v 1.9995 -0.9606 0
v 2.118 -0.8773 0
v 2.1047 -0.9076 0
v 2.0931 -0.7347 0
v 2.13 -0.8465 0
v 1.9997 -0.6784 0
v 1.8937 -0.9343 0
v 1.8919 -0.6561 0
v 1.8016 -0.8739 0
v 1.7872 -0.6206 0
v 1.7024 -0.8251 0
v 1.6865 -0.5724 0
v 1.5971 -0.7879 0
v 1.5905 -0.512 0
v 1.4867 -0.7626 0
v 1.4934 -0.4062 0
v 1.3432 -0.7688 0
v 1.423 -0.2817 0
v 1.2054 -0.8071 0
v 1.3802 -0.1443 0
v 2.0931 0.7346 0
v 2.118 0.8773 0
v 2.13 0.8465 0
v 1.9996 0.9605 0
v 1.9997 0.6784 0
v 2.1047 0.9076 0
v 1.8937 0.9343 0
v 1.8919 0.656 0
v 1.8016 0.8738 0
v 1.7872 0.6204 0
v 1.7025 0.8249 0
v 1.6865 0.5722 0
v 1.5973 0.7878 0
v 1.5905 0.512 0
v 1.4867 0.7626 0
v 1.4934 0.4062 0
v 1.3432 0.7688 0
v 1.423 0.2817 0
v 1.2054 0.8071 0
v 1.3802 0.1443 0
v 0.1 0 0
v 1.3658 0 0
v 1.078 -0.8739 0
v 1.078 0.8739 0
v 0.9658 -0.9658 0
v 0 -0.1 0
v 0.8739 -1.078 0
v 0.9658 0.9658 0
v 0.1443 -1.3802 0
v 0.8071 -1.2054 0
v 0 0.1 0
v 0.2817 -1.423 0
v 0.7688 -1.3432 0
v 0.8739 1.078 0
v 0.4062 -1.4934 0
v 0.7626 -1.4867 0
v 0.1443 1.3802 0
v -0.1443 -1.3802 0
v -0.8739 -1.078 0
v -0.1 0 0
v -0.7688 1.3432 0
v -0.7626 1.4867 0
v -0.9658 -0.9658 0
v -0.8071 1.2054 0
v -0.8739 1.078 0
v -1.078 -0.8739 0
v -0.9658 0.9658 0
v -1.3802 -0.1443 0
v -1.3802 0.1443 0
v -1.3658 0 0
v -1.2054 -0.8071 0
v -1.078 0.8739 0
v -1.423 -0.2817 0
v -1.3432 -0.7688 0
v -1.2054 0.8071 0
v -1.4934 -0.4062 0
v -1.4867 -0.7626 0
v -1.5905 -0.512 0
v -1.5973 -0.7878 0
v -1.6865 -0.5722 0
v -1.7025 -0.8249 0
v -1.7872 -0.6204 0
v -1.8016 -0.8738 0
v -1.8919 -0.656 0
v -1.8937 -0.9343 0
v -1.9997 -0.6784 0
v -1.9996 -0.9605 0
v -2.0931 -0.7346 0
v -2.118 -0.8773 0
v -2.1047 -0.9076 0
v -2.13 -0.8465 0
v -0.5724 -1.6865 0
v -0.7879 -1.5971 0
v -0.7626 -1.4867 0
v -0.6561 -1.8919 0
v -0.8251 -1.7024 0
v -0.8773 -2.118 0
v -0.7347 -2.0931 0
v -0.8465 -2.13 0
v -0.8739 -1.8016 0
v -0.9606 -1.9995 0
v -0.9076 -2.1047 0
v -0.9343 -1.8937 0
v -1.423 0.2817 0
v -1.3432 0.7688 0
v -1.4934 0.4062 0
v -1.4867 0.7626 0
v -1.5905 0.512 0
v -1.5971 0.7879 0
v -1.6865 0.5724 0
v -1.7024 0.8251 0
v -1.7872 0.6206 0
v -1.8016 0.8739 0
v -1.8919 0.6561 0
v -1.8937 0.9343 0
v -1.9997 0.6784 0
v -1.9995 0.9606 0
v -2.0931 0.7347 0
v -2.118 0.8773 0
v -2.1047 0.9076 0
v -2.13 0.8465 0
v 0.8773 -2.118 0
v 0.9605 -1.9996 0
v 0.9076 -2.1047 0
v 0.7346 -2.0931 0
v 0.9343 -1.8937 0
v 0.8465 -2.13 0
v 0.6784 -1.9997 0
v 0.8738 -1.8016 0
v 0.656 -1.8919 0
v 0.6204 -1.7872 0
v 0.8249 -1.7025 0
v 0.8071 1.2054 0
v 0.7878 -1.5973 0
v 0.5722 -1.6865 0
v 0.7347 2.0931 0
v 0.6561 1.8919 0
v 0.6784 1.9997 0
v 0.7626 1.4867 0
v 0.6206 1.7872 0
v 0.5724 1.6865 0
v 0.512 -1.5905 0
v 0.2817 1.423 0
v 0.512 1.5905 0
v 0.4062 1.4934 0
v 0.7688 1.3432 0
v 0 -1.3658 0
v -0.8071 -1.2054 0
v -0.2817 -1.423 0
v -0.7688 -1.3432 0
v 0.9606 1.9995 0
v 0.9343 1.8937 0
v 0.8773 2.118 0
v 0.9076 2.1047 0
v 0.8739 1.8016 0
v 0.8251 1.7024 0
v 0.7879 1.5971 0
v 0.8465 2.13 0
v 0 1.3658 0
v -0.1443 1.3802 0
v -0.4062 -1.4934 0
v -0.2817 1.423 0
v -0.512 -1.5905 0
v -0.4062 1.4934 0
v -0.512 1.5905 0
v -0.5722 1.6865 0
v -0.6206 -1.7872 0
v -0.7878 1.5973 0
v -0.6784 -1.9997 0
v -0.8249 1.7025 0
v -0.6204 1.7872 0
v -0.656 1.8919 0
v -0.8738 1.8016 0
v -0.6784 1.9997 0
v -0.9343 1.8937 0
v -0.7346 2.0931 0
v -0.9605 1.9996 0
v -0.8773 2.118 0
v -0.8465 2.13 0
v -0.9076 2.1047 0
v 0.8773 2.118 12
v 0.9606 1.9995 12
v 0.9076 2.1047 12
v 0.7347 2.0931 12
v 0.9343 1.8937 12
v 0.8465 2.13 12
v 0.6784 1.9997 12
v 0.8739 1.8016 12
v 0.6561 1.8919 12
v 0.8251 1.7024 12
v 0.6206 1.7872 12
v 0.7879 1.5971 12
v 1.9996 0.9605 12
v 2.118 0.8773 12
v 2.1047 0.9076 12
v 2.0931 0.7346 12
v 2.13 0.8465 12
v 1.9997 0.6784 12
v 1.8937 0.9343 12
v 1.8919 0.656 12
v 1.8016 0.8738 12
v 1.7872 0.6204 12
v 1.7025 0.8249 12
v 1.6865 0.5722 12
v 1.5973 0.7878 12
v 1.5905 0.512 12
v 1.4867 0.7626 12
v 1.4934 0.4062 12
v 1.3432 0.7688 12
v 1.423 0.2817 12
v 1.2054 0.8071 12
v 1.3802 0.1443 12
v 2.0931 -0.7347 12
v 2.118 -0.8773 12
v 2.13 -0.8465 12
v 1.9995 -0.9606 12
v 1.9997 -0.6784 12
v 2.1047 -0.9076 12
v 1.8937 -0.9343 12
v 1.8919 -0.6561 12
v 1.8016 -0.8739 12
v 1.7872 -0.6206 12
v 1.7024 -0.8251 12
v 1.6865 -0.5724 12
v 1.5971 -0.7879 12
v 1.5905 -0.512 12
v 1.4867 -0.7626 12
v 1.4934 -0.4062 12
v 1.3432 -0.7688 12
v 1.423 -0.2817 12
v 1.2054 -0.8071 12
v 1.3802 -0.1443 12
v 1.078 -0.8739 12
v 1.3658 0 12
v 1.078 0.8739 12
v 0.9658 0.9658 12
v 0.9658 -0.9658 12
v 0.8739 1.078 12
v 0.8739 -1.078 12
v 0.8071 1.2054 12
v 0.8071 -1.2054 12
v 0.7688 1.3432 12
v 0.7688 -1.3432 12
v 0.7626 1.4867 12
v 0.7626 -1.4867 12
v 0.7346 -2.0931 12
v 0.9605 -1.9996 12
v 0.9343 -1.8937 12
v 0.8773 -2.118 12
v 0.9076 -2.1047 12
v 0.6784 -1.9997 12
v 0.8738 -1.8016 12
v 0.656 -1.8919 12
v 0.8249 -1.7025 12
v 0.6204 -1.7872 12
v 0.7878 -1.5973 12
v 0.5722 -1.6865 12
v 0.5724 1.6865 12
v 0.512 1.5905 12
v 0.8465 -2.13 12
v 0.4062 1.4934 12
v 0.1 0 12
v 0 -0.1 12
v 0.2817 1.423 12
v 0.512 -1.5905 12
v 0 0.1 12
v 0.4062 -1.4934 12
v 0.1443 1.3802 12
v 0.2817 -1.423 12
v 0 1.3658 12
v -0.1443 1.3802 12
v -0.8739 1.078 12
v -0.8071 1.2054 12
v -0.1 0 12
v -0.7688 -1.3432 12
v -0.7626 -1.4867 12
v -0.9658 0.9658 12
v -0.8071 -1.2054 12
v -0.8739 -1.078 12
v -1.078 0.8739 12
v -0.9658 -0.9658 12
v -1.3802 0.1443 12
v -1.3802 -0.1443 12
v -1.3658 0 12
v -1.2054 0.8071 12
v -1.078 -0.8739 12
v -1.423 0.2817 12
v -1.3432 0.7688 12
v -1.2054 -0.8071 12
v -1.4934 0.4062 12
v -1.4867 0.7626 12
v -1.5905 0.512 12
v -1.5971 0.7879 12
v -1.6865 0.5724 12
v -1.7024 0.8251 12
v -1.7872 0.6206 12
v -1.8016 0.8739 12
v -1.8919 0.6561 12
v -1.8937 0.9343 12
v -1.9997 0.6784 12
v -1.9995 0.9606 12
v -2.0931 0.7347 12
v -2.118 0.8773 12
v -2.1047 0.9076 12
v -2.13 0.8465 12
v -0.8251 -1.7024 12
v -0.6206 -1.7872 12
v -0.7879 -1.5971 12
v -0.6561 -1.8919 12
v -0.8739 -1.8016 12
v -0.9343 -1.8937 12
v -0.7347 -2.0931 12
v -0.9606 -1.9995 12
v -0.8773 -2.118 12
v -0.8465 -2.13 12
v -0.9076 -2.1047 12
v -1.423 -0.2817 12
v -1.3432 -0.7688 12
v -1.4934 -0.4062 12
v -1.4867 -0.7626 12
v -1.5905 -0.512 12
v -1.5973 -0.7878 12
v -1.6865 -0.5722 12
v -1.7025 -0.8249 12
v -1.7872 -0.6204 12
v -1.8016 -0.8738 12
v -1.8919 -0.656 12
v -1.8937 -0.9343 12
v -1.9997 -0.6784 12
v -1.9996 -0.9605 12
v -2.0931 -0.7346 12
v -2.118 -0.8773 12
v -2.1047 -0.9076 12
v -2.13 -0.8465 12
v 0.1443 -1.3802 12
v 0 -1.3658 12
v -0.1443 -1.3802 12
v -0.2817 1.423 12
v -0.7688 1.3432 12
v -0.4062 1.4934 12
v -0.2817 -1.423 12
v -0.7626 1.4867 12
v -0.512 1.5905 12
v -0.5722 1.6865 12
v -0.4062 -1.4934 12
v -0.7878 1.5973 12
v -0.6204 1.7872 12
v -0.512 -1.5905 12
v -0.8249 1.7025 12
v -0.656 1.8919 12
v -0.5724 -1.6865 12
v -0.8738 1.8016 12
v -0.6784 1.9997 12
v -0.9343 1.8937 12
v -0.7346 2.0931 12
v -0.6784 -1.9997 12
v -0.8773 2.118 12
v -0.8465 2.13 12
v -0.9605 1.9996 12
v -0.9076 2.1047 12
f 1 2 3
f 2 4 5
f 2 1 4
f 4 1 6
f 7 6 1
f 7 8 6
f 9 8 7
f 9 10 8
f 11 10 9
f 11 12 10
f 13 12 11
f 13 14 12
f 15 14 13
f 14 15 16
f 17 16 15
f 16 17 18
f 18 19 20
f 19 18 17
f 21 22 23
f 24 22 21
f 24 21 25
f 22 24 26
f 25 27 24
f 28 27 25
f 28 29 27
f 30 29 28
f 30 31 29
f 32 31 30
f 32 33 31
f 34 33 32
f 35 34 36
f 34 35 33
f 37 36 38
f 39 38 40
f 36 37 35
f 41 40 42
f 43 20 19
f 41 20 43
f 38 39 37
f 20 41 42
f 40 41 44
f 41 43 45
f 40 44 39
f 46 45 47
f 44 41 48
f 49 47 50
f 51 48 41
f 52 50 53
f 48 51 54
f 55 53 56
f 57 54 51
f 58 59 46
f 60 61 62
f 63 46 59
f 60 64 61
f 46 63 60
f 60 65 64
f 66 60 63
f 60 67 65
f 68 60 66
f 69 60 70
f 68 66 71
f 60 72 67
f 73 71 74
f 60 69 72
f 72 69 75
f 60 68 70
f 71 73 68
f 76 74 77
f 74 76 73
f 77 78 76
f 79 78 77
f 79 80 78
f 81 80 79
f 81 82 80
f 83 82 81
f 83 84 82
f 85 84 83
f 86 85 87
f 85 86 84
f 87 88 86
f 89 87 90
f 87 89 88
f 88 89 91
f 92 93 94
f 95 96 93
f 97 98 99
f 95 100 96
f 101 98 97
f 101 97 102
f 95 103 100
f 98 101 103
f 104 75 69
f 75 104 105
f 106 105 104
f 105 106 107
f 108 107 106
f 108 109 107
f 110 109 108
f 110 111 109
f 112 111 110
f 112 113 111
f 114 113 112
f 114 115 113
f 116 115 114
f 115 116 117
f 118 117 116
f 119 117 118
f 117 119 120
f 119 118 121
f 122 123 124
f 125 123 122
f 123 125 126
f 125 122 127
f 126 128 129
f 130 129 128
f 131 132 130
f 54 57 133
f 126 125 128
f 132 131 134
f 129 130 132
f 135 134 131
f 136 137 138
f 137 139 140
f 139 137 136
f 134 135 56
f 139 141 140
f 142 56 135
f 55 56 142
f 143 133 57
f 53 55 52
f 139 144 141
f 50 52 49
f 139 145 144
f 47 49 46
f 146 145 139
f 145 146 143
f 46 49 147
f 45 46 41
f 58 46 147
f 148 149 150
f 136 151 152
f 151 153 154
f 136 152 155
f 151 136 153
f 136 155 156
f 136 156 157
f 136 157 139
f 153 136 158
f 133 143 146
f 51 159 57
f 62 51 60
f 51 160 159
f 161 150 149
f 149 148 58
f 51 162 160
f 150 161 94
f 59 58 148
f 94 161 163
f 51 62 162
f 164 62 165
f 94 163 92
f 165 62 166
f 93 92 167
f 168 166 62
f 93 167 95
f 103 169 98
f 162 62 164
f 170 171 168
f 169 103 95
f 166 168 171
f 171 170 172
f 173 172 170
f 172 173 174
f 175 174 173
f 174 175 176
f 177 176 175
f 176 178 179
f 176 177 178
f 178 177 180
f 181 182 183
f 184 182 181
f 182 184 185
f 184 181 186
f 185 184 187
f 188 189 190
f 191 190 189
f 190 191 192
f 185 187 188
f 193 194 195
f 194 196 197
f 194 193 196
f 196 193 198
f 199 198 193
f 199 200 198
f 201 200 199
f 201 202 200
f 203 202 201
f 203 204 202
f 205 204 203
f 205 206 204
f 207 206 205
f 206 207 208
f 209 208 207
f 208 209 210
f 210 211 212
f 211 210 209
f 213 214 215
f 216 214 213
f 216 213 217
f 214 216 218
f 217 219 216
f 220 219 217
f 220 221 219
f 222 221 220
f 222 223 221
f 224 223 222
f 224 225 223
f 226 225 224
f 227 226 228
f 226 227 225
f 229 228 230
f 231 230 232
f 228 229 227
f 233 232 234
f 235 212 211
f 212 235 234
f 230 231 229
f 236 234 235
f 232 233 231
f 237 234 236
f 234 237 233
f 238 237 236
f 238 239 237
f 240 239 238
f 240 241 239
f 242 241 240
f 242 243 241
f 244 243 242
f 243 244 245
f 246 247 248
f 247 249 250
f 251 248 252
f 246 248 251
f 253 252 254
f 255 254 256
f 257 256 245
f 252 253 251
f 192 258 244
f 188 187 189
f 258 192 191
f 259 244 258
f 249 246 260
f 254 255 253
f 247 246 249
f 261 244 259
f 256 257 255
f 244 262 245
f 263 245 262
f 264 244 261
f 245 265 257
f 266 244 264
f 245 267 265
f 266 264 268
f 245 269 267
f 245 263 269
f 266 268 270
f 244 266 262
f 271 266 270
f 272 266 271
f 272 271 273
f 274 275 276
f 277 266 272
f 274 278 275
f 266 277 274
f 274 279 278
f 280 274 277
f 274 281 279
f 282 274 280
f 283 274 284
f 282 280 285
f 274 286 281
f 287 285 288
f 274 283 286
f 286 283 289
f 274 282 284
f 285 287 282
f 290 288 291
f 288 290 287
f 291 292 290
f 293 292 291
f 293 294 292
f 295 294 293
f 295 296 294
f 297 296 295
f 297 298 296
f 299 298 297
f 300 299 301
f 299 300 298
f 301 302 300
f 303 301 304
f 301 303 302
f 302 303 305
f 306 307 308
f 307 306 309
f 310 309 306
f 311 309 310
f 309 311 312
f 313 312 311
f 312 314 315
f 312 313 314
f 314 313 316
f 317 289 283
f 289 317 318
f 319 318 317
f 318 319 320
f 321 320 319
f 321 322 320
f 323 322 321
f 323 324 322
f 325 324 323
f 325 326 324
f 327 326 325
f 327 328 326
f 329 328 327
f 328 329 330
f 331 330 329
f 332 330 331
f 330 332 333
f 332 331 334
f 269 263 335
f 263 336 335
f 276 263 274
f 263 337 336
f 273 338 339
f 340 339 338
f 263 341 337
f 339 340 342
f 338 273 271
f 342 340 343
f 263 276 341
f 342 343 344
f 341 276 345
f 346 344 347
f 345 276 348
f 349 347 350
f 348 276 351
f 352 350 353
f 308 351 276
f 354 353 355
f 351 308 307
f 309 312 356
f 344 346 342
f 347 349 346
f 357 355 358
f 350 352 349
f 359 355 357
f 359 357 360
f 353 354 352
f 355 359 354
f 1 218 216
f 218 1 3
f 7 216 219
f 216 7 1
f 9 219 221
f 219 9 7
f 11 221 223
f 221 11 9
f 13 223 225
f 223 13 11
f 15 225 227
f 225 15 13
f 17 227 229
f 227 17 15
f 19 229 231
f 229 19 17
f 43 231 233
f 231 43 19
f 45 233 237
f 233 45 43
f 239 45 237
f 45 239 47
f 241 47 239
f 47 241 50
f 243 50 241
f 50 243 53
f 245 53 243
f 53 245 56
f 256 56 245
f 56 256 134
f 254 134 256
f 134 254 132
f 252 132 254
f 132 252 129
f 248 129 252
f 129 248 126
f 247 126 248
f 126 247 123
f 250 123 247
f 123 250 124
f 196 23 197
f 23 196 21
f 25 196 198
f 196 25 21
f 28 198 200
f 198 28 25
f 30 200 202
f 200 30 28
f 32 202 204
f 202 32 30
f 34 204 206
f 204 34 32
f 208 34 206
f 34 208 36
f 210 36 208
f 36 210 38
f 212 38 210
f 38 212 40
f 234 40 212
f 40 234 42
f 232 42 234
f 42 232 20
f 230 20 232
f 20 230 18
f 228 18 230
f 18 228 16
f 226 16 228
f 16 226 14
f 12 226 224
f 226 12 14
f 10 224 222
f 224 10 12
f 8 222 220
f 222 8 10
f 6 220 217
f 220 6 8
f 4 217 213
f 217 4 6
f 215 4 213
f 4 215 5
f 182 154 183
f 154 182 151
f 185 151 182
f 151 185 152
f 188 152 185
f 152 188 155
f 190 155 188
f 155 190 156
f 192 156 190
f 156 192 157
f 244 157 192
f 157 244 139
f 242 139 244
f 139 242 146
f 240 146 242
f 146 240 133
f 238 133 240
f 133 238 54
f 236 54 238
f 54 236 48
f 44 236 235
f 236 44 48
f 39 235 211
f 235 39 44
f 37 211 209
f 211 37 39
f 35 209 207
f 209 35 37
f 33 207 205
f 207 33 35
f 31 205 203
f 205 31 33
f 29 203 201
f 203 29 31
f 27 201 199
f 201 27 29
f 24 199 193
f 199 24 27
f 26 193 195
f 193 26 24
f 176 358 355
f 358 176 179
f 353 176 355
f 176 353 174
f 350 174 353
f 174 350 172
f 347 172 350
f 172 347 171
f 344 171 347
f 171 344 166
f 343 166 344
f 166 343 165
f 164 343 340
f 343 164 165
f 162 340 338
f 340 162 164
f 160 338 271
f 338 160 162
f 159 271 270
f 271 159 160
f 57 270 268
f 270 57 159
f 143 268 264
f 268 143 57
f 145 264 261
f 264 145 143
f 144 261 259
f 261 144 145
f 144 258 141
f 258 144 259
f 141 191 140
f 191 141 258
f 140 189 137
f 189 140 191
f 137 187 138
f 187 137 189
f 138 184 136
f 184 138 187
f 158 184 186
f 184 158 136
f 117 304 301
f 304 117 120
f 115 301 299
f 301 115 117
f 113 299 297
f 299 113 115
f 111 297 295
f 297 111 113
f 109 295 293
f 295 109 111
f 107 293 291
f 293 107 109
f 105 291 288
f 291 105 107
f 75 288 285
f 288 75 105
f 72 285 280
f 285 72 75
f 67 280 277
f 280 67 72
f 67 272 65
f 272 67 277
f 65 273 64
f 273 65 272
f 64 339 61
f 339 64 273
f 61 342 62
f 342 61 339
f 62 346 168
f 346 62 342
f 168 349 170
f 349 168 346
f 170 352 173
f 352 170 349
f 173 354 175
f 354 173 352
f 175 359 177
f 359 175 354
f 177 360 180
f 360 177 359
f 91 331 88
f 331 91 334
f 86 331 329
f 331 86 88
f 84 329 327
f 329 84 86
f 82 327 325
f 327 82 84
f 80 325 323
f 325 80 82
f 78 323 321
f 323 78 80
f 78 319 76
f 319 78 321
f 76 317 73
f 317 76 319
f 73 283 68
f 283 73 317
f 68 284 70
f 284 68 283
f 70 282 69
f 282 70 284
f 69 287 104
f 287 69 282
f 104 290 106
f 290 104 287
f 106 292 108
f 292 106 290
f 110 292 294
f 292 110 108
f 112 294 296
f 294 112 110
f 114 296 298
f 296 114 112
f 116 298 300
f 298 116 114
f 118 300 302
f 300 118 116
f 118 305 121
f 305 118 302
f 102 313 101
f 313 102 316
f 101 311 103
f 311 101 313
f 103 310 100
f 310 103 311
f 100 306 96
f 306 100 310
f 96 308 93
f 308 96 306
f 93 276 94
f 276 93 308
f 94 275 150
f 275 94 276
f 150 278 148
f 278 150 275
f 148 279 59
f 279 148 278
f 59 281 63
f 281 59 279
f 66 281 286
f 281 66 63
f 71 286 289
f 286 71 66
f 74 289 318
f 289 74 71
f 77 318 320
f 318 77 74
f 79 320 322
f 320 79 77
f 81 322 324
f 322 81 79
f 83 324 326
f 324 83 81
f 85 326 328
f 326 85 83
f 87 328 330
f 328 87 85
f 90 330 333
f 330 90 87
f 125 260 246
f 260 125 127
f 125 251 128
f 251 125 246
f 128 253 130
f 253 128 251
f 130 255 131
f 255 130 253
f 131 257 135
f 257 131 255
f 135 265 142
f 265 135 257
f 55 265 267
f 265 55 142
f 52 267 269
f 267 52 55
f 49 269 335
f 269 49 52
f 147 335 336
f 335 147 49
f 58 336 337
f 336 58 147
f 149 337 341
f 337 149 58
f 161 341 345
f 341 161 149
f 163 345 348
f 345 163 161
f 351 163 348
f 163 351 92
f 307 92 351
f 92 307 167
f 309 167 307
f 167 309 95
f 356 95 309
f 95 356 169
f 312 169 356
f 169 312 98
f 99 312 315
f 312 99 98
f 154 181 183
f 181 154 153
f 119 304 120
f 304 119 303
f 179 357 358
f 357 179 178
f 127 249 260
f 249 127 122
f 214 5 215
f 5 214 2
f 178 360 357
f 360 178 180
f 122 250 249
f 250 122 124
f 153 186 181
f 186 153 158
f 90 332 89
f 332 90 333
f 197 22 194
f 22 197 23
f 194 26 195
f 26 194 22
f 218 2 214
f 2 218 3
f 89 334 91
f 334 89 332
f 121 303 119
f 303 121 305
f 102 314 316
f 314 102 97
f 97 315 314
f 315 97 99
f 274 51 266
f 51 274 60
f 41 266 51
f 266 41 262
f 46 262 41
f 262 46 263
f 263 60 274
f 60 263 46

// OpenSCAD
// Parametric Pulley with multiple belt profiles
// by droftarts January 2012
// updated and changed by Oscar January 2018 (https://www.thingiverse.com/0scar/about)

// Based on pulleys by:
// http://www.thingiverse.com/thing:11256 by me!
// https://github.com/prusajr/PrusaMendel by Josef Prusa
// http://www.thingiverse.com/thing:3104 by GilesBathgate
// http://www.thingiverse.com/thing:2079 by nophead

// dxf tooth data from http://oem.cadregister.com/asp/PPOW_Entry.asp?company=915217&elementID=07807803/METRIC/URETH/WV0025/F
// pulley diameter checked and modelled from data at http://www.sdp-si.com/D265/HTML/D265T016.html

/**
 * @name Pulley
 * @category Printed
 * @using 1 x m3 nut, normal or nyloc
 * @using 1 x m3x10 set screw or 1 x m3x8 grub screw
 */

// ------------------------
// Idler profile parameters
// ------------------------
//number_of_teeth_test = 60; // [10:100]
profile = 12; // [1:MXL, 2:40DP, 3:XL, 4:H, 5:T2.5, 6:T5, 7:T10, 8:AT5, 9:HTD_3mm, 10:HTD_5mm, 11:HTD_8mm, 12:GT2_2mm, 13:GT2_3mm, 14:GT2_5mm]
motor_shaft_diameter = 0; // (in mm)
//toothed_part_length = 10; // [3:30] (in mm)
base_height = 0; // [0:30] (in mm, 6 is typical)
base_diameter = 0;   // [10:50] (in mm)

// ---------------------------
// Idler & retainer parameters
// ---------------------------
belt_retainer = 0; // [0:No, 1:Yes]
retainer_height_p = 1.0; // [0.5:Tiny (0.5mm), 1:Small (1mm), 1.5:Normal (1.5mm), 2:Big (2mm), 3:Bigger (3mm), 4:Hudge (5mm)]
belt_idler = 0; // [0:No, 1:Yes]
// Height of idler flange over pulley. Set to same as base height if you want an idler but no pulley.
idler_height_p = 1.0; // [0.5:Tiny (0.5mm), 1:Small (1mm), 1.5:Normal (1.5mm), 2:Big (2mm), 3:Bigger (3mm), 4:Hudge (5mm)]

// ---------------
// Shaft fastening
// ---------------
screws_disposition = 0; // [0:None, 1:1 screw, 2:2 screws at 90deg, 3:3 screws at 120deg, 4:4 screws at 90deg]
nut_shape = 1; // [1:Hexagonal, 0:Square]
screw_profile = 4; // [0:M1, 1:M1.6, 2:M2, 3:M2.5, 4:M3, 5:M4, 6:M5, 7:M6]

// Distance between inner face of nut and shaft - can be negative - (in mm).
nut_shaft_distance = 1.2;

// Bolt head shape (0 is inactive) subtracts a bolt head sized hexagon for hexagon bolts
idler_bolt_option = 0; // [0:none, 1:M3, 2:M4, 3:M5, 4:M6, 5:M8, 6:M10, 7:M12, 8:custom] for custom: make changes below!

// Optional metal flange attachment (0 is inactive)
flange_option = 0;
flange_screw_profile = 5; // [0:M1, 1:M1.6, 2:M2, 3:M2.5, 4:M3, 5:M4, 6:M5, 7:M6]
flange_screws_disposition = 4; // [0:None, 1:1 screw, 2:2 screws at 180deg, 3:3 screws at 120deg, 4:4 screws at 90deg]
flange_screwoffset_radius = 26/2;
flange_diam = 32; // Set to zero to disable the flange to be sunk in the idler
flange_thickness = 3; // Set to zero to disable the flange to be sunk in the idler
flange_use_tap = 1; // Diameter is smaller when used for tapping, 0 to larger hole for easy fit


// --------------------------------------------------
// ADVANCED parameters for scaling tooth for good fit
// --------------------------------------------------
// To improve fit of belt to pulley, set the following constant.
// Decrease or increase by 0.1mm at a time. We are modelling the
// *BELT* tooth here, not the tooth on the pulley. Increasing the
// number will *decrease* the pulley tooth size. Increasing the
// tooth width will also scale proportionately the tooth depth,
// to maintain the shape of the tooth, and increase how far into
// the pulley the tooth is indented. Can be negative too!
additional_tooth_width = 0.2; //mm
// If you need more tooth depth than this provides, adjust the
// following constant. However, this will cause the shape of the
// tooth to change.
additional_tooth_depth = 0; //mm

// ------------------------------------
// Calculated parameters (do not alter)
// ------------------------------------
idler_height = (belt_idler==0 ? 0 : idler_height_p);
retainer_height = (belt_retainer==0 ? 0 : retainer_height_p);
//echo (str("Idler height\t= ",idler_height," mm"));
//echo (str("Retainer height\t= ",retainer_height," mm"));
no_of_nuts = screws_disposition;
nut_angle = no_of_nuts != 3 ? 90 : 120;
motor_shaft = motor_shaft_diameter + 0.2;
screw_diameters = [1, 1.6, 2, 2.5, 3, 4, 5, 6];
nut_widths = [2.5, 3.2, 4, 5, 5.5, 7, 8, 10];
nut_depths = [1, 1.3, 1.6, 2, 2.4, 3.2, 4.7, 5.2];
// bolthead size circ.[ none,    M3,    M4,   M5,    M6,    M8,   M10,   M12, custom]
bolt_head_diameters = [0.000, 6.010, 7.660, 8.79, 11.05, 14.38, 17.77, 20.03,  15.8]; // circle diameter, not width across flats!
bolt_head_heights =   [0.000, 2.125, 2.925, 3.65,  4.15,  5.45,  6.58,  7.68,   5.5];
screw_diameter = screw_diameters[screw_profile] + 0.2;
nut_width = nut_widths[screw_profile] + 0.2;
nut_depth = nut_depths[screw_profile] + 0.3;
bolt_head_diam = bolt_head_diameters[idler_bolt_option] + 0.2; // + 0.1-2 for tight fit
bolt_head_height = bolt_head_heights[idler_bolt_option] + 0.2;
screw_hole_sf = flange_use_tap == 1 ? 0.9 : 1.1; // 0.9 is the recommended value for taps of fine thread, 0.85 for coarse threads
flange_screw_diameter = screw_diameters[flange_screw_profile] * screw_hole_sf; 
flange_no_of_screws = flange_screws_disposition;
flange_screw_angle = flange_no_of_screws != 3 ? (flange_no_of_screws == 2 ? 180 : 90) : 120;

// --------------------
// Calculated constants
// --------------------
nut_elevation = base_height/2;
metric_nut_width_across_points = 2*((nut_width/2)/cos(30)); // This is needed for the nut trap
// The following set the pulley diameter for a given number of teeth
//MXL_pulley_dia = tooth_spacing (2.032,0.254, number_of_teeth);
//40DP_pulley_dia = tooth_spacing (2.07264,0.1778, number_of_teeth);
//XL_pulley_dia = tooth_spacing (5.08,0.254, number_of_teeth);
//H_pulley_dia = tooth_spacing (9.525,0.381, number_of_teeth);
//T2_5_pulley_dia = tooth_spaceing_curvefit (0.7467,0.796,1.026, number_of_teeth);
//T5_pulley_dia = tooth_spaceing_curvefit (0.6523,1.591,1.064, number_of_teeth);
//T10_pulley_dia = tooth_spacing (10,0.93, number_of_teeth);
//AT5_pulley_dia = tooth_spaceing_curvefit (0.6523,1.591,1.064, number_of_teeth);
//HTD_3mm_pulley_dia = tooth_spacing (3,0.381, number_of_teeth);
//HTD_5mm_pulley_dia = tooth_spacing (5,0.5715, number_of_teeth);
//HTD_8mm_pulley_dia = tooth_spacing (8,0.6858, number_of_teeth);
//GT2_2mm_pulley_dia = tooth_spacing (2,0.254, number_of_teeth);

//GT2_3mm_pulley_dia = tooth_spacing (3,0.381, number_of_teeth);
//GT2_5mm_pulley_dia = tooth_spacing (5,0.5715, number_of_teeth);
// The following calls the pulley creation part, and passes the pulley diameter and tooth width to that module
//if ( profile == 1 ) {pulley("MXL" , MXL_pulley_dia , 0.508 , 1.321 ); }
//if ( profile == 2 ) {pulley("40 D.P." , 40DP_pulley_dia , 0.457 , 1.226 ); }
//if ( profile == 3 ) {pulley("XL" , XL_pulley_dia , 1.27, 3.051 ); }
//if ( profile == 4 ) {pulley("H" , H_pulley_dia ,1.905 , 5.359 ); }
//if ( profile == 5 ) {pulley("T2.5" , T2_5_pulley_dia , 0.7 , 1.678 ); }
//if ( profile == 6 ) {pulley("T5" , T5_pulley_dia , 1.19 , 3.264 ); }
//if ( profile == 7 ) {pulley("T10" , T10_pulley_dia , 2.5 , 6.13 ); }
//if ( profile == 8 ) {pulley("AT5" , AT5_pulley_dia , 1.19 , 4.268 ); }
//if ( profile == 9 ) {pulley("HTD 3mm" , HTD_3mm_pulley_dia , 1.289 , 2.27 ); }
//if ( profile == 10 ){pulley("HTD 5mm" , HTD_5mm_pulley_dia , 2.199 , 3.781 ); }
//if ( profile == 11 ){pulley("HTD 8mm" , HTD_8mm_pulley_dia , 3.607 , 6.603 ); }
// oldif ( profile == 12 ){pulley("GT2 2mm" , GT2_2mm_pulley_dia , 0.764 , 1.494, number_of_teeth_test ); }


#pulley_gt2(8,12);

module pulley_gt2(number_of_teeth,depth){

  {pulley("GT2 2mm" , tooth_spacing (2,0.254, number_of_teeth) , 0.764 , 1.494, number_of_teeth, depth); }
}
//if ( profile == 13 ){pulley("GT2 3mm" , GT2_3mm_pulley_dia , 1.169 , 2.31 ); }
//if ( profile == 14 ){pulley("GT2 5mm" , GT2_5mm_pulley_dia , 1.969 , 3.952 ); }

// ---------
// Functions
// ---------
function tooth_spaceing_curvefit (b,c,d, number_of_teeth)
  = ((c * pow(number_of_teeth,d)) / (b + pow(number_of_teeth,d))) * number_of_teeth ;

function tooth_spacing(tooth_pitch,pitch_line_offset, number_of_teeth)
  = (2*((number_of_teeth*tooth_pitch)/(3.14159265*2)-pitch_line_offset)) ;

// ================================================================================
// Main Module
// ================================================================================
module pulley( belt_type , pulley_OD , tooth_depth , tooth_width, number_of_teeth,toothed_part_length ){
  echo (str("Belt type = ",belt_type,"; Number of teeth = ",number_of_teeth,"; Pulley Outside Diameter = ",pulley_OD,"mm "));
  tooth_distance_from_centre = sqrt( pow(pulley_OD/2,2) - pow((tooth_width+additional_tooth_width)/2,2));
  tooth_width_scale = (tooth_width + additional_tooth_width ) / tooth_width;
  tooth_depth_scale = ((tooth_depth + additional_tooth_depth ) / tooth_depth) ;

  difference(){   
    translate([0,0,idler_height]){
      union(){
        //base
        if (( base_height < 2 ) && (no_of_nuts > 0)){ 
          if (base_height != 0){
            echo ("CAN'T DRAW PULLEY BASE, HEIGHT LESS THAN 2!!!"); 
          }
        } else {
          translate([0,0,-idler_height]){
            cylinder(d=base_diameter, h=base_height, $fn=base_diameter*20, center=false);
          }
        }

        difference(){
          //shaft - diameter is outside diameter of pulley
          translate([0,0,base_height]){ 
            rotate ([0,0,360/(number_of_teeth*4)]){
              //cylinder(r=pulley_OD/2,h=toothed_part_length, $fn=number_of_teeth*4);
              cylinder(r=pulley_OD/2,h=toothed_part_length, $fn=number_of_teeth*20);
            }
          }
          //teeth - cut out of shaft
          for(i=[1:number_of_teeth]){
            rotate([0,0,i*(360/number_of_teeth)]){
              translate([0,-tooth_distance_from_centre,base_height]){
                scale ([ tooth_width_scale , tooth_depth_scale , 1 ]){
                if ( profile == 1  ) { MXL();}
                if ( profile == 2  ) { 40DP();}
                if ( profile == 3  ) { XL();}
                if ( profile == 4  ) { H();}
                if ( profile == 5  ) { T2_5();}
                if ( profile == 6  ) { T5();}
                if ( profile == 7  ) { T10();}
                if ( profile == 8  ) { AT5();}
                if ( profile == 9  ) { HTD_3mm();}
                if ( profile == 10 ) { HTD_5mm();}
                if ( profile == 11 ) { HTD_8mm();}
                if ( profile == 12 ) { GT2_2mm(toothed_part_length);}
                if ( profile == 13 ) { GT2_3mm();}
                if ( profile == 14 ) { GT2_5mm();}
                }
              }
            }
          }
        } // end of difference in union
          
        // Top belt retainer / idler
        if ( belt_retainer == 1 ){
          translate ([0,0, base_height + toothed_part_length ]){
            cylinder(r1 = pulley_OD/2, r2 = pulley_OD/2 + 2*retainer_height/3, h = 2*retainer_height/3, $fn = pulley_OD*20, center = false);
            translate([0,0,2*retainer_height/3]){
              cylinder(r = pulley_OD/2 + 2*retainer_height/3, h = retainer_height/3, $fn = pulley_OD*20, center = false);
            }
          }
        }
        // Bottom belt retainer
        if ( belt_idler == 1 ){
          translate ([0,0, base_height - idler_height ]){
            cylinder(r = pulley_OD/2 + 2*retainer_height/3, h = retainer_height/3, $fn = pulley_OD*20, center = false);
            translate([0,0,retainer_height/3]){
              cylinder(r2 = pulley_OD/2, r1 = pulley_OD/2 + 2*retainer_height/3, h = 2*retainer_height/3, $fn = pulley_OD*20, center = false);
            }
          }
        }
      } // end of union
    } // end of translation before union
   
    //hole for motor shaft
    translate([0,0,-1]){
      cylinder(r=motor_shaft/2,h=base_height + idler_height + toothed_part_length + retainer_height + 2,$fn=motor_shaft*20);
    }
          
    //captive nut and grub screw holes
    if ( base_height < nut_width ){
      if (base_height != 0){
        echo ("CAN'T DRAW CAPTIVE NUTS, HEIGHT LESS THAN NUT DIAMETER!!!");
      }
    } else {
      if ( (base_diameter - motor_shaft)/2 < nut_depth + 3 ) { 
        echo ("CAN'T DRAW CAPTIVE NUTS, DIAMETER TOO SMALL FOR NUT DEPTH!!!");
      } else {
        // Iterate over nuts amount
        if (no_of_nuts > 0){
          for(j=[1:no_of_nuts]){
            rotate([0,0,j*nut_angle]){
              translate([0,0,nut_elevation])rotate([90,0,0]){
                union(){
                  //entrance
                  translate([0,-base_height/4-0.5,motor_shaft/2+nut_depth/2+nut_shaft_distance]) cube([nut_width,base_height/2+1,nut_depth],center=true);
                  //nut
                  if ( nut_shape > 0 ){
                    // hex nut
                    translate([0,0.25,motor_shaft/2+nut_depth/2+nut_shaft_distance]) rotate([0,0,30]) cylinder(r=metric_nut_width_across_points/2,h=nut_depth,center=true,$fn=6);
                  } else {
                    // square nut
                    translate([0,0.25,motor_shaft/2+nut_depth/2+nut_shaft_distance]) cube([nut_width,nut_width,nut_depth],center=true);
                  }

                  //grub screw hole
                  //rotate([0,0,22.5])cylinder(r=screw_diameter/2,h=base_diameter/2+1,$fn=8);
                  rotate([0,0,22.5])cylinder(r=screw_diameter/2,h=base_diameter/2+1,$fn=60);
                }
              }
            }
          }
        }
      }
    }
    // Remove hexagon for hexagon bolt head shaft
    if (idler_bolt_option == 1){
      translate([0,0,base_height + toothed_part_length + retainer_height + idler_height - bolt_head_height]){
        cylinder(d=bolt_head_diam,h=bolt_head_height+0.1,$fn=6);
      }
    }
    // Remove flange and tap screw holes
    if (flange_option == 1){
      if (flange_thickness > 0) {
        translate([0,0,base_height + toothed_part_length + retainer_height + idler_height - flange_thickness]){
          cylinder(d=flange_diam+0.2,h=flange_thickness+0.1,$fn=180);
        }
      }
      // Iterate over screws amount
      if (flange_screws_disposition > 0){
        for(j=[1:flange_no_of_screws]){
          rotate([0,0,j*flange_screw_angle]){
            translate([-flange_screwoffset_radius,0,base_height-0.1]){
              cylinder(d=flange_screw_diameter,h=toothed_part_length + retainer_height + idler_height - flange_thickness+0.2,$fn=180);
            }
          }
        }
      }
    }
  }
}

// Tooth profile modules

module MXL()
  {
  linear_extrude(height=toothed_part_length+2) polygon([[-0.660421,-0.5],[-0.660421,0],[-0.621898,0.006033],[-0.587714,0.023037],[-0.560056,0.049424],[-0.541182,0.083609],[-0.417357,0.424392],[-0.398413,0.458752],[-0.370649,0.48514],[-0.336324,0.502074],[-0.297744,0.508035],[0.297744,0.508035],[0.336268,0.502074],[0.370452,0.48514],[0.39811,0.458752],[0.416983,0.424392],[0.540808,0.083609],[0.559752,0.049424],[0.587516,0.023037],[0.621841,0.006033],[0.660421,0],[0.660421,-0.5]]);
  }

module 40DP()
  {
  linear_extrude(height=toothed_part_length+2) polygon([[-0.612775,-0.5],[-0.612775,0],[-0.574719,0.010187],[-0.546453,0.0381],[-0.355953,0.3683],[-0.327604,0.405408],[-0.291086,0.433388],[-0.248548,0.451049],[-0.202142,0.4572],[0.202494,0.4572],[0.248653,0.451049],[0.291042,0.433388],[0.327609,0.405408],[0.356306,0.3683],[0.546806,0.0381],[0.574499,0.010187],[0.612775,0],[0.612775,-0.5]]);
  }

module XL()
  {
  linear_extrude(height=toothed_part_length+2) polygon([[-1.525411,-1],[-1.525411,0],[-1.41777,0.015495],[-1.320712,0.059664],[-1.239661,0.129034],[-1.180042,0.220133],[-0.793044,1.050219],[-0.733574,1.141021],[-0.652507,1.210425],[-0.555366,1.254759],[-0.447675,1.270353],[0.447675,1.270353],[0.555366,1.254759],[0.652507,1.210425],[0.733574,1.141021],[0.793044,1.050219],[1.180042,0.220133],[1.239711,0.129034],[1.320844,0.059664],[1.417919,0.015495],[1.525411,0],[1.525411,-1]]);
  }

module H()
  {
  linear_extrude(height=toothed_part_length+2) polygon([[-2.6797,-1],[-2.6797,0],[-2.600907,0.006138],[-2.525342,0.024024],[-2.45412,0.052881],[-2.388351,0.091909],[-2.329145,0.140328],[-2.277614,0.197358],[-2.234875,0.262205],[-2.202032,0.334091],[-1.75224,1.57093],[-1.719538,1.642815],[-1.676883,1.707663],[-1.62542,1.764693],[-1.566256,1.813112],[-1.500512,1.85214],[-1.4293,1.880997],[-1.353742,1.898883],[-1.274949,1.905021],[1.275281,1.905021],[1.354056,1.898883],[1.429576,1.880997],[1.500731,1.85214],[1.566411,1.813112],[1.625508,1.764693],[1.676919,1.707663],[1.719531,1.642815],[1.752233,1.57093],[2.20273,0.334091],[2.235433,0.262205],[2.278045,0.197358],[2.329455,0.140328],[2.388553,0.091909],[2.454233,0.052881],[2.525384,0.024024],[2.600904,0.006138],[2.6797,0],[2.6797,-1]]);
  }

module T2_5()
  {
  linear_extrude(height=toothed_part_length+2) polygon([[-0.839258,-0.5],[-0.839258,0],[-0.770246,0.021652],[-0.726369,0.079022],[-0.529167,0.620889],[-0.485025,0.67826],[-0.416278,0.699911],[0.416278,0.699911],[0.484849,0.67826],[0.528814,0.620889],[0.726369,0.079022],[0.770114,0.021652],[0.839258,0],[0.839258,-0.5]]);
  }

module T5()
  {
  linear_extrude(height=toothed_part_length+2) polygon([[-1.632126,-0.5],[-1.632126,0],[-1.568549,0.004939],[-1.507539,0.019367],[-1.450023,0.042686],[-1.396912,0.074224],[-1.349125,0.113379],[-1.307581,0.159508],[-1.273186,0.211991],[-1.246868,0.270192],[-1.009802,0.920362],[-0.983414,0.978433],[-0.949018,1.030788],[-0.907524,1.076798],[-0.859829,1.115847],[-0.80682,1.147314],[-0.749402,1.170562],[-0.688471,1.184956],[-0.624921,1.189895],[0.624971,1.189895],[0.688622,1.184956],[0.749607,1.170562],[0.807043,1.147314],[0.860055,1.115847],[0.907754,1.076798],[0.949269,1.030788],[0.9837,0.978433],[1.010193,0.920362],[1.246907,0.270192],[1.273295,0.211991],[1.307726,0.159508],[1.349276,0.113379],[1.397039,0.074224],[1.450111,0.042686],[1.507589,0.019367],[1.568563,0.004939],[1.632126,0],[1.632126,-0.5]]);
  }

module T10()
  {
  linear_extrude(height=toothed_part_length+2) polygon([[-3.06511,-1],[-3.06511,0],[-2.971998,0.007239],[-2.882718,0.028344],[-2.79859,0.062396],[-2.720931,0.108479],[-2.651061,0.165675],[-2.590298,0.233065],[-2.539962,0.309732],[-2.501371,0.394759],[-1.879071,2.105025],[-1.840363,2.190052],[-1.789939,2.266719],[-1.729114,2.334109],[-1.659202,2.391304],[-1.581518,2.437387],[-1.497376,2.47144],[-1.408092,2.492545],[-1.314979,2.499784],[1.314979,2.499784],[1.408091,2.492545],[1.497371,2.47144],[1.581499,2.437387],[1.659158,2.391304],[1.729028,2.334109],[1.789791,2.266719],[1.840127,2.190052],[1.878718,2.105025],[2.501018,0.394759],[2.539726,0.309732],[2.59015,0.233065],[2.650975,0.165675],[2.720887,0.108479],[2.798571,0.062396],[2.882713,0.028344],[2.971997,0.007239],[3.06511,0],[3.06511,-1]]);
  }

module AT5()
  {
  linear_extrude(height=toothed_part_length+2) polygon([[-2.134129,-0.75],[-2.134129,0],[-2.058023,0.005488],[-1.984595,0.021547],[-1.914806,0.047569],[-1.849614,0.082947],[-1.789978,0.127073],[-1.736857,0.179338],[-1.691211,0.239136],[-1.653999,0.305859],[-1.349199,0.959203],[-1.286933,1.054635],[-1.201914,1.127346],[-1.099961,1.173664],[-0.986896,1.18992],[0.986543,1.18992],[1.099614,1.173664],[1.201605,1.127346],[1.286729,1.054635],[1.349199,0.959203],[1.653646,0.305859],[1.690859,0.239136],[1.73651,0.179338],[1.789644,0.127073],[1.849305,0.082947],[1.914539,0.047569],[1.984392,0.021547],[2.057906,0.005488],[2.134129,0],[2.134129,-0.75]]);
  }

module HTD_3mm()
  {
  linear_extrude(height=toothed_part_length+2) polygon([[-1.135062,-0.5],[-1.135062,0],[-1.048323,0.015484],[-0.974284,0.058517],[-0.919162,0.123974],[-0.889176,0.206728],[-0.81721,0.579614],[-0.800806,0.653232],[-0.778384,0.72416],[-0.750244,0.792137],[-0.716685,0.856903],[-0.678005,0.918199],[-0.634505,0.975764],[-0.586483,1.029338],[-0.534238,1.078662],[-0.47807,1.123476],[-0.418278,1.16352],[-0.355162,1.198533],[-0.289019,1.228257],[-0.22015,1.25243],[-0.148854,1.270793],[-0.07543,1.283087],[-0.000176,1.28905],[0.075081,1.283145],[0.148515,1.270895],[0.219827,1.252561],[0.288716,1.228406],[0.354879,1.19869],[0.418018,1.163675],[0.477831,1.123623],[0.534017,1.078795],[0.586276,1.029452],[0.634307,0.975857],[0.677809,0.91827],[0.716481,0.856953],[0.750022,0.792167],[0.778133,0.724174],[0.800511,0.653236],[0.816857,0.579614],[0.888471,0.206728],[0.919014,0.123974],[0.974328,0.058517],[1.048362,0.015484],[1.135062,0],[1.135062,-0.5]]);
  }

module HTD_5mm()
  {
  linear_extrude(height=toothed_part_length+2) polygon([[-1.89036,-0.75],[-1.89036,0],[-1.741168,0.02669],[-1.61387,0.100806],[-1.518984,0.21342],[-1.467026,0.3556],[-1.427162,0.960967],[-1.398568,1.089602],[-1.359437,1.213531],[-1.310296,1.332296],[-1.251672,1.445441],[-1.184092,1.552509],[-1.108081,1.653042],[-1.024167,1.746585],[-0.932877,1.832681],[-0.834736,1.910872],[-0.730271,1.980701],[-0.62001,2.041713],[-0.504478,2.09345],[-0.384202,2.135455],[-0.259708,2.167271],[-0.131524,2.188443],[-0.000176,2.198511],[0.131296,2.188504],[0.259588,2.167387],[0.384174,2.135616],[0.504527,2.093648],[0.620123,2.04194],[0.730433,1.980949],[0.834934,1.911132],[0.933097,1.832945],[1.024398,1.746846],[1.108311,1.653291],[1.184308,1.552736],[1.251865,1.445639],[1.310455,1.332457],[1.359552,1.213647],[1.39863,1.089664],[1.427162,0.960967],[1.467026,0.3556],[1.518984,0.21342],[1.61387,0.100806],[1.741168,0.02669],[1.89036,0],[1.89036,-0.75]]);
  }

module HTD_8mm()
  {
  linear_extrude(height=toothed_part_length+2) polygon([[-3.301471,-1],[-3.301471,0],[-3.16611,0.012093],[-3.038062,0.047068],[-2.919646,0.10297],[-2.813182,0.177844],[-2.720989,0.269734],[-2.645387,0.376684],[-2.588694,0.496739],[-2.553229,0.627944],[-2.460801,1.470025],[-2.411413,1.691917],[-2.343887,1.905691],[-2.259126,2.110563],[-2.158035,2.30575],[-2.041518,2.490467],[-1.910478,2.66393],[-1.76582,2.825356],[-1.608446,2.973961],[-1.439261,3.10896],[-1.259169,3.22957],[-1.069074,3.335006],[-0.869878,3.424485],[-0.662487,3.497224],[-0.447804,3.552437],[-0.226732,3.589341],[-0.000176,3.607153],[0.226511,3.589461],[0.447712,3.552654],[0.66252,3.497516],[0.870027,3.424833],[1.069329,3.33539],[1.259517,3.229973],[1.439687,3.109367],[1.608931,2.974358],[1.766344,2.825731],[1.911018,2.664271],[2.042047,2.490765],[2.158526,2.305998],[2.259547,2.110755],[2.344204,1.905821],[2.411591,1.691983],[2.460801,1.470025],[2.553229,0.627944],[2.588592,0.496739],[2.645238,0.376684],[2.720834,0.269734],[2.81305,0.177844],[2.919553,0.10297],[3.038012,0.047068],[3.166095,0.012093],[3.301471,0],[3.301471,-1]]);
  }

module GT2_2mm(depth)
  {
  linear_extrude(depth) polygon([[0.747183,-0.5],[0.747183,0],[0.647876,0.037218],[0.598311,0.130528],[0.578556,0.238423],[0.547158,0.343077],[0.504649,0.443762],[0.451556,0.53975],[0.358229,0.636924],[0.2484,0.707276],[0.127259,0.750044],[0,0.76447],[-0.127259,0.750044],[-0.2484,0.707276],[-0.358229,0.636924],[-0.451556,0.53975],[-0.504797,0.443762],[-0.547291,0.343077],[-0.578605,0.238423],[-0.598311,0.130528],[-0.648009,0.037218],[-0.747183,0],[-0.747183,-0.5]]);
  }

module GT2_3mm()
  {
  linear_extrude(height=toothed_part_length+2) polygon([[-1.155171,-0.5],[-1.155171,0],[-1.065317,0.016448],[-0.989057,0.062001],[-0.93297,0.130969],[-0.90364,0.217664],[-0.863705,0.408181],[-0.800056,0.591388],[-0.713587,0.765004],[-0.60519,0.926747],[-0.469751,1.032548],[-0.320719,1.108119],[-0.162625,1.153462],[0,1.168577],[0.162625,1.153462],[0.320719,1.108119],[0.469751,1.032548],[0.60519,0.926747],[0.713587,0.765004],[0.800056,0.591388],[0.863705,0.408181],[0.90364,0.217664],[0.932921,0.130969],[0.988924,0.062001],[1.065168,0.016448],[1.155171,0],[1.155171,-0.5]]);
  }

module GT2_5mm()
  {
  linear_extrude(height=toothed_part_length+2) polygon([[-1.975908,-0.75],[-1.975908,0],[-1.797959,0.03212],[-1.646634,0.121224],[-1.534534,0.256431],[-1.474258,0.426861],[-1.446911,0.570808],[-1.411774,0.712722],[-1.368964,0.852287],[-1.318597,0.989189],[-1.260788,1.123115],[-1.195654,1.25375],[-1.12331,1.380781],[-1.043869,1.503892],[-0.935264,1.612278],[-0.817959,1.706414],[-0.693181,1.786237],[-0.562151,1.851687],[-0.426095,1.9027],[-0.286235,1.939214],[-0.143795,1.961168],[0,1.9685],[0.143796,1.961168],[0.286235,1.939214],[0.426095,1.9027],[0.562151,1.851687],[0.693181,1.786237],[0.817959,1.706414],[0.935263,1.612278],[1.043869,1.503892],[1.123207,1.380781],[1.195509,1.25375],[1.26065,1.123115],[1.318507,0.989189],[1.368956,0.852287],[1.411872,0.712722],[1.447132,0.570808],[1.474611,0.426861],[1.534583,0.256431],[1.646678,0.121223],[1.798064,0.03212],[1.975908,0],[1.975908,-0.75]]);
  }
